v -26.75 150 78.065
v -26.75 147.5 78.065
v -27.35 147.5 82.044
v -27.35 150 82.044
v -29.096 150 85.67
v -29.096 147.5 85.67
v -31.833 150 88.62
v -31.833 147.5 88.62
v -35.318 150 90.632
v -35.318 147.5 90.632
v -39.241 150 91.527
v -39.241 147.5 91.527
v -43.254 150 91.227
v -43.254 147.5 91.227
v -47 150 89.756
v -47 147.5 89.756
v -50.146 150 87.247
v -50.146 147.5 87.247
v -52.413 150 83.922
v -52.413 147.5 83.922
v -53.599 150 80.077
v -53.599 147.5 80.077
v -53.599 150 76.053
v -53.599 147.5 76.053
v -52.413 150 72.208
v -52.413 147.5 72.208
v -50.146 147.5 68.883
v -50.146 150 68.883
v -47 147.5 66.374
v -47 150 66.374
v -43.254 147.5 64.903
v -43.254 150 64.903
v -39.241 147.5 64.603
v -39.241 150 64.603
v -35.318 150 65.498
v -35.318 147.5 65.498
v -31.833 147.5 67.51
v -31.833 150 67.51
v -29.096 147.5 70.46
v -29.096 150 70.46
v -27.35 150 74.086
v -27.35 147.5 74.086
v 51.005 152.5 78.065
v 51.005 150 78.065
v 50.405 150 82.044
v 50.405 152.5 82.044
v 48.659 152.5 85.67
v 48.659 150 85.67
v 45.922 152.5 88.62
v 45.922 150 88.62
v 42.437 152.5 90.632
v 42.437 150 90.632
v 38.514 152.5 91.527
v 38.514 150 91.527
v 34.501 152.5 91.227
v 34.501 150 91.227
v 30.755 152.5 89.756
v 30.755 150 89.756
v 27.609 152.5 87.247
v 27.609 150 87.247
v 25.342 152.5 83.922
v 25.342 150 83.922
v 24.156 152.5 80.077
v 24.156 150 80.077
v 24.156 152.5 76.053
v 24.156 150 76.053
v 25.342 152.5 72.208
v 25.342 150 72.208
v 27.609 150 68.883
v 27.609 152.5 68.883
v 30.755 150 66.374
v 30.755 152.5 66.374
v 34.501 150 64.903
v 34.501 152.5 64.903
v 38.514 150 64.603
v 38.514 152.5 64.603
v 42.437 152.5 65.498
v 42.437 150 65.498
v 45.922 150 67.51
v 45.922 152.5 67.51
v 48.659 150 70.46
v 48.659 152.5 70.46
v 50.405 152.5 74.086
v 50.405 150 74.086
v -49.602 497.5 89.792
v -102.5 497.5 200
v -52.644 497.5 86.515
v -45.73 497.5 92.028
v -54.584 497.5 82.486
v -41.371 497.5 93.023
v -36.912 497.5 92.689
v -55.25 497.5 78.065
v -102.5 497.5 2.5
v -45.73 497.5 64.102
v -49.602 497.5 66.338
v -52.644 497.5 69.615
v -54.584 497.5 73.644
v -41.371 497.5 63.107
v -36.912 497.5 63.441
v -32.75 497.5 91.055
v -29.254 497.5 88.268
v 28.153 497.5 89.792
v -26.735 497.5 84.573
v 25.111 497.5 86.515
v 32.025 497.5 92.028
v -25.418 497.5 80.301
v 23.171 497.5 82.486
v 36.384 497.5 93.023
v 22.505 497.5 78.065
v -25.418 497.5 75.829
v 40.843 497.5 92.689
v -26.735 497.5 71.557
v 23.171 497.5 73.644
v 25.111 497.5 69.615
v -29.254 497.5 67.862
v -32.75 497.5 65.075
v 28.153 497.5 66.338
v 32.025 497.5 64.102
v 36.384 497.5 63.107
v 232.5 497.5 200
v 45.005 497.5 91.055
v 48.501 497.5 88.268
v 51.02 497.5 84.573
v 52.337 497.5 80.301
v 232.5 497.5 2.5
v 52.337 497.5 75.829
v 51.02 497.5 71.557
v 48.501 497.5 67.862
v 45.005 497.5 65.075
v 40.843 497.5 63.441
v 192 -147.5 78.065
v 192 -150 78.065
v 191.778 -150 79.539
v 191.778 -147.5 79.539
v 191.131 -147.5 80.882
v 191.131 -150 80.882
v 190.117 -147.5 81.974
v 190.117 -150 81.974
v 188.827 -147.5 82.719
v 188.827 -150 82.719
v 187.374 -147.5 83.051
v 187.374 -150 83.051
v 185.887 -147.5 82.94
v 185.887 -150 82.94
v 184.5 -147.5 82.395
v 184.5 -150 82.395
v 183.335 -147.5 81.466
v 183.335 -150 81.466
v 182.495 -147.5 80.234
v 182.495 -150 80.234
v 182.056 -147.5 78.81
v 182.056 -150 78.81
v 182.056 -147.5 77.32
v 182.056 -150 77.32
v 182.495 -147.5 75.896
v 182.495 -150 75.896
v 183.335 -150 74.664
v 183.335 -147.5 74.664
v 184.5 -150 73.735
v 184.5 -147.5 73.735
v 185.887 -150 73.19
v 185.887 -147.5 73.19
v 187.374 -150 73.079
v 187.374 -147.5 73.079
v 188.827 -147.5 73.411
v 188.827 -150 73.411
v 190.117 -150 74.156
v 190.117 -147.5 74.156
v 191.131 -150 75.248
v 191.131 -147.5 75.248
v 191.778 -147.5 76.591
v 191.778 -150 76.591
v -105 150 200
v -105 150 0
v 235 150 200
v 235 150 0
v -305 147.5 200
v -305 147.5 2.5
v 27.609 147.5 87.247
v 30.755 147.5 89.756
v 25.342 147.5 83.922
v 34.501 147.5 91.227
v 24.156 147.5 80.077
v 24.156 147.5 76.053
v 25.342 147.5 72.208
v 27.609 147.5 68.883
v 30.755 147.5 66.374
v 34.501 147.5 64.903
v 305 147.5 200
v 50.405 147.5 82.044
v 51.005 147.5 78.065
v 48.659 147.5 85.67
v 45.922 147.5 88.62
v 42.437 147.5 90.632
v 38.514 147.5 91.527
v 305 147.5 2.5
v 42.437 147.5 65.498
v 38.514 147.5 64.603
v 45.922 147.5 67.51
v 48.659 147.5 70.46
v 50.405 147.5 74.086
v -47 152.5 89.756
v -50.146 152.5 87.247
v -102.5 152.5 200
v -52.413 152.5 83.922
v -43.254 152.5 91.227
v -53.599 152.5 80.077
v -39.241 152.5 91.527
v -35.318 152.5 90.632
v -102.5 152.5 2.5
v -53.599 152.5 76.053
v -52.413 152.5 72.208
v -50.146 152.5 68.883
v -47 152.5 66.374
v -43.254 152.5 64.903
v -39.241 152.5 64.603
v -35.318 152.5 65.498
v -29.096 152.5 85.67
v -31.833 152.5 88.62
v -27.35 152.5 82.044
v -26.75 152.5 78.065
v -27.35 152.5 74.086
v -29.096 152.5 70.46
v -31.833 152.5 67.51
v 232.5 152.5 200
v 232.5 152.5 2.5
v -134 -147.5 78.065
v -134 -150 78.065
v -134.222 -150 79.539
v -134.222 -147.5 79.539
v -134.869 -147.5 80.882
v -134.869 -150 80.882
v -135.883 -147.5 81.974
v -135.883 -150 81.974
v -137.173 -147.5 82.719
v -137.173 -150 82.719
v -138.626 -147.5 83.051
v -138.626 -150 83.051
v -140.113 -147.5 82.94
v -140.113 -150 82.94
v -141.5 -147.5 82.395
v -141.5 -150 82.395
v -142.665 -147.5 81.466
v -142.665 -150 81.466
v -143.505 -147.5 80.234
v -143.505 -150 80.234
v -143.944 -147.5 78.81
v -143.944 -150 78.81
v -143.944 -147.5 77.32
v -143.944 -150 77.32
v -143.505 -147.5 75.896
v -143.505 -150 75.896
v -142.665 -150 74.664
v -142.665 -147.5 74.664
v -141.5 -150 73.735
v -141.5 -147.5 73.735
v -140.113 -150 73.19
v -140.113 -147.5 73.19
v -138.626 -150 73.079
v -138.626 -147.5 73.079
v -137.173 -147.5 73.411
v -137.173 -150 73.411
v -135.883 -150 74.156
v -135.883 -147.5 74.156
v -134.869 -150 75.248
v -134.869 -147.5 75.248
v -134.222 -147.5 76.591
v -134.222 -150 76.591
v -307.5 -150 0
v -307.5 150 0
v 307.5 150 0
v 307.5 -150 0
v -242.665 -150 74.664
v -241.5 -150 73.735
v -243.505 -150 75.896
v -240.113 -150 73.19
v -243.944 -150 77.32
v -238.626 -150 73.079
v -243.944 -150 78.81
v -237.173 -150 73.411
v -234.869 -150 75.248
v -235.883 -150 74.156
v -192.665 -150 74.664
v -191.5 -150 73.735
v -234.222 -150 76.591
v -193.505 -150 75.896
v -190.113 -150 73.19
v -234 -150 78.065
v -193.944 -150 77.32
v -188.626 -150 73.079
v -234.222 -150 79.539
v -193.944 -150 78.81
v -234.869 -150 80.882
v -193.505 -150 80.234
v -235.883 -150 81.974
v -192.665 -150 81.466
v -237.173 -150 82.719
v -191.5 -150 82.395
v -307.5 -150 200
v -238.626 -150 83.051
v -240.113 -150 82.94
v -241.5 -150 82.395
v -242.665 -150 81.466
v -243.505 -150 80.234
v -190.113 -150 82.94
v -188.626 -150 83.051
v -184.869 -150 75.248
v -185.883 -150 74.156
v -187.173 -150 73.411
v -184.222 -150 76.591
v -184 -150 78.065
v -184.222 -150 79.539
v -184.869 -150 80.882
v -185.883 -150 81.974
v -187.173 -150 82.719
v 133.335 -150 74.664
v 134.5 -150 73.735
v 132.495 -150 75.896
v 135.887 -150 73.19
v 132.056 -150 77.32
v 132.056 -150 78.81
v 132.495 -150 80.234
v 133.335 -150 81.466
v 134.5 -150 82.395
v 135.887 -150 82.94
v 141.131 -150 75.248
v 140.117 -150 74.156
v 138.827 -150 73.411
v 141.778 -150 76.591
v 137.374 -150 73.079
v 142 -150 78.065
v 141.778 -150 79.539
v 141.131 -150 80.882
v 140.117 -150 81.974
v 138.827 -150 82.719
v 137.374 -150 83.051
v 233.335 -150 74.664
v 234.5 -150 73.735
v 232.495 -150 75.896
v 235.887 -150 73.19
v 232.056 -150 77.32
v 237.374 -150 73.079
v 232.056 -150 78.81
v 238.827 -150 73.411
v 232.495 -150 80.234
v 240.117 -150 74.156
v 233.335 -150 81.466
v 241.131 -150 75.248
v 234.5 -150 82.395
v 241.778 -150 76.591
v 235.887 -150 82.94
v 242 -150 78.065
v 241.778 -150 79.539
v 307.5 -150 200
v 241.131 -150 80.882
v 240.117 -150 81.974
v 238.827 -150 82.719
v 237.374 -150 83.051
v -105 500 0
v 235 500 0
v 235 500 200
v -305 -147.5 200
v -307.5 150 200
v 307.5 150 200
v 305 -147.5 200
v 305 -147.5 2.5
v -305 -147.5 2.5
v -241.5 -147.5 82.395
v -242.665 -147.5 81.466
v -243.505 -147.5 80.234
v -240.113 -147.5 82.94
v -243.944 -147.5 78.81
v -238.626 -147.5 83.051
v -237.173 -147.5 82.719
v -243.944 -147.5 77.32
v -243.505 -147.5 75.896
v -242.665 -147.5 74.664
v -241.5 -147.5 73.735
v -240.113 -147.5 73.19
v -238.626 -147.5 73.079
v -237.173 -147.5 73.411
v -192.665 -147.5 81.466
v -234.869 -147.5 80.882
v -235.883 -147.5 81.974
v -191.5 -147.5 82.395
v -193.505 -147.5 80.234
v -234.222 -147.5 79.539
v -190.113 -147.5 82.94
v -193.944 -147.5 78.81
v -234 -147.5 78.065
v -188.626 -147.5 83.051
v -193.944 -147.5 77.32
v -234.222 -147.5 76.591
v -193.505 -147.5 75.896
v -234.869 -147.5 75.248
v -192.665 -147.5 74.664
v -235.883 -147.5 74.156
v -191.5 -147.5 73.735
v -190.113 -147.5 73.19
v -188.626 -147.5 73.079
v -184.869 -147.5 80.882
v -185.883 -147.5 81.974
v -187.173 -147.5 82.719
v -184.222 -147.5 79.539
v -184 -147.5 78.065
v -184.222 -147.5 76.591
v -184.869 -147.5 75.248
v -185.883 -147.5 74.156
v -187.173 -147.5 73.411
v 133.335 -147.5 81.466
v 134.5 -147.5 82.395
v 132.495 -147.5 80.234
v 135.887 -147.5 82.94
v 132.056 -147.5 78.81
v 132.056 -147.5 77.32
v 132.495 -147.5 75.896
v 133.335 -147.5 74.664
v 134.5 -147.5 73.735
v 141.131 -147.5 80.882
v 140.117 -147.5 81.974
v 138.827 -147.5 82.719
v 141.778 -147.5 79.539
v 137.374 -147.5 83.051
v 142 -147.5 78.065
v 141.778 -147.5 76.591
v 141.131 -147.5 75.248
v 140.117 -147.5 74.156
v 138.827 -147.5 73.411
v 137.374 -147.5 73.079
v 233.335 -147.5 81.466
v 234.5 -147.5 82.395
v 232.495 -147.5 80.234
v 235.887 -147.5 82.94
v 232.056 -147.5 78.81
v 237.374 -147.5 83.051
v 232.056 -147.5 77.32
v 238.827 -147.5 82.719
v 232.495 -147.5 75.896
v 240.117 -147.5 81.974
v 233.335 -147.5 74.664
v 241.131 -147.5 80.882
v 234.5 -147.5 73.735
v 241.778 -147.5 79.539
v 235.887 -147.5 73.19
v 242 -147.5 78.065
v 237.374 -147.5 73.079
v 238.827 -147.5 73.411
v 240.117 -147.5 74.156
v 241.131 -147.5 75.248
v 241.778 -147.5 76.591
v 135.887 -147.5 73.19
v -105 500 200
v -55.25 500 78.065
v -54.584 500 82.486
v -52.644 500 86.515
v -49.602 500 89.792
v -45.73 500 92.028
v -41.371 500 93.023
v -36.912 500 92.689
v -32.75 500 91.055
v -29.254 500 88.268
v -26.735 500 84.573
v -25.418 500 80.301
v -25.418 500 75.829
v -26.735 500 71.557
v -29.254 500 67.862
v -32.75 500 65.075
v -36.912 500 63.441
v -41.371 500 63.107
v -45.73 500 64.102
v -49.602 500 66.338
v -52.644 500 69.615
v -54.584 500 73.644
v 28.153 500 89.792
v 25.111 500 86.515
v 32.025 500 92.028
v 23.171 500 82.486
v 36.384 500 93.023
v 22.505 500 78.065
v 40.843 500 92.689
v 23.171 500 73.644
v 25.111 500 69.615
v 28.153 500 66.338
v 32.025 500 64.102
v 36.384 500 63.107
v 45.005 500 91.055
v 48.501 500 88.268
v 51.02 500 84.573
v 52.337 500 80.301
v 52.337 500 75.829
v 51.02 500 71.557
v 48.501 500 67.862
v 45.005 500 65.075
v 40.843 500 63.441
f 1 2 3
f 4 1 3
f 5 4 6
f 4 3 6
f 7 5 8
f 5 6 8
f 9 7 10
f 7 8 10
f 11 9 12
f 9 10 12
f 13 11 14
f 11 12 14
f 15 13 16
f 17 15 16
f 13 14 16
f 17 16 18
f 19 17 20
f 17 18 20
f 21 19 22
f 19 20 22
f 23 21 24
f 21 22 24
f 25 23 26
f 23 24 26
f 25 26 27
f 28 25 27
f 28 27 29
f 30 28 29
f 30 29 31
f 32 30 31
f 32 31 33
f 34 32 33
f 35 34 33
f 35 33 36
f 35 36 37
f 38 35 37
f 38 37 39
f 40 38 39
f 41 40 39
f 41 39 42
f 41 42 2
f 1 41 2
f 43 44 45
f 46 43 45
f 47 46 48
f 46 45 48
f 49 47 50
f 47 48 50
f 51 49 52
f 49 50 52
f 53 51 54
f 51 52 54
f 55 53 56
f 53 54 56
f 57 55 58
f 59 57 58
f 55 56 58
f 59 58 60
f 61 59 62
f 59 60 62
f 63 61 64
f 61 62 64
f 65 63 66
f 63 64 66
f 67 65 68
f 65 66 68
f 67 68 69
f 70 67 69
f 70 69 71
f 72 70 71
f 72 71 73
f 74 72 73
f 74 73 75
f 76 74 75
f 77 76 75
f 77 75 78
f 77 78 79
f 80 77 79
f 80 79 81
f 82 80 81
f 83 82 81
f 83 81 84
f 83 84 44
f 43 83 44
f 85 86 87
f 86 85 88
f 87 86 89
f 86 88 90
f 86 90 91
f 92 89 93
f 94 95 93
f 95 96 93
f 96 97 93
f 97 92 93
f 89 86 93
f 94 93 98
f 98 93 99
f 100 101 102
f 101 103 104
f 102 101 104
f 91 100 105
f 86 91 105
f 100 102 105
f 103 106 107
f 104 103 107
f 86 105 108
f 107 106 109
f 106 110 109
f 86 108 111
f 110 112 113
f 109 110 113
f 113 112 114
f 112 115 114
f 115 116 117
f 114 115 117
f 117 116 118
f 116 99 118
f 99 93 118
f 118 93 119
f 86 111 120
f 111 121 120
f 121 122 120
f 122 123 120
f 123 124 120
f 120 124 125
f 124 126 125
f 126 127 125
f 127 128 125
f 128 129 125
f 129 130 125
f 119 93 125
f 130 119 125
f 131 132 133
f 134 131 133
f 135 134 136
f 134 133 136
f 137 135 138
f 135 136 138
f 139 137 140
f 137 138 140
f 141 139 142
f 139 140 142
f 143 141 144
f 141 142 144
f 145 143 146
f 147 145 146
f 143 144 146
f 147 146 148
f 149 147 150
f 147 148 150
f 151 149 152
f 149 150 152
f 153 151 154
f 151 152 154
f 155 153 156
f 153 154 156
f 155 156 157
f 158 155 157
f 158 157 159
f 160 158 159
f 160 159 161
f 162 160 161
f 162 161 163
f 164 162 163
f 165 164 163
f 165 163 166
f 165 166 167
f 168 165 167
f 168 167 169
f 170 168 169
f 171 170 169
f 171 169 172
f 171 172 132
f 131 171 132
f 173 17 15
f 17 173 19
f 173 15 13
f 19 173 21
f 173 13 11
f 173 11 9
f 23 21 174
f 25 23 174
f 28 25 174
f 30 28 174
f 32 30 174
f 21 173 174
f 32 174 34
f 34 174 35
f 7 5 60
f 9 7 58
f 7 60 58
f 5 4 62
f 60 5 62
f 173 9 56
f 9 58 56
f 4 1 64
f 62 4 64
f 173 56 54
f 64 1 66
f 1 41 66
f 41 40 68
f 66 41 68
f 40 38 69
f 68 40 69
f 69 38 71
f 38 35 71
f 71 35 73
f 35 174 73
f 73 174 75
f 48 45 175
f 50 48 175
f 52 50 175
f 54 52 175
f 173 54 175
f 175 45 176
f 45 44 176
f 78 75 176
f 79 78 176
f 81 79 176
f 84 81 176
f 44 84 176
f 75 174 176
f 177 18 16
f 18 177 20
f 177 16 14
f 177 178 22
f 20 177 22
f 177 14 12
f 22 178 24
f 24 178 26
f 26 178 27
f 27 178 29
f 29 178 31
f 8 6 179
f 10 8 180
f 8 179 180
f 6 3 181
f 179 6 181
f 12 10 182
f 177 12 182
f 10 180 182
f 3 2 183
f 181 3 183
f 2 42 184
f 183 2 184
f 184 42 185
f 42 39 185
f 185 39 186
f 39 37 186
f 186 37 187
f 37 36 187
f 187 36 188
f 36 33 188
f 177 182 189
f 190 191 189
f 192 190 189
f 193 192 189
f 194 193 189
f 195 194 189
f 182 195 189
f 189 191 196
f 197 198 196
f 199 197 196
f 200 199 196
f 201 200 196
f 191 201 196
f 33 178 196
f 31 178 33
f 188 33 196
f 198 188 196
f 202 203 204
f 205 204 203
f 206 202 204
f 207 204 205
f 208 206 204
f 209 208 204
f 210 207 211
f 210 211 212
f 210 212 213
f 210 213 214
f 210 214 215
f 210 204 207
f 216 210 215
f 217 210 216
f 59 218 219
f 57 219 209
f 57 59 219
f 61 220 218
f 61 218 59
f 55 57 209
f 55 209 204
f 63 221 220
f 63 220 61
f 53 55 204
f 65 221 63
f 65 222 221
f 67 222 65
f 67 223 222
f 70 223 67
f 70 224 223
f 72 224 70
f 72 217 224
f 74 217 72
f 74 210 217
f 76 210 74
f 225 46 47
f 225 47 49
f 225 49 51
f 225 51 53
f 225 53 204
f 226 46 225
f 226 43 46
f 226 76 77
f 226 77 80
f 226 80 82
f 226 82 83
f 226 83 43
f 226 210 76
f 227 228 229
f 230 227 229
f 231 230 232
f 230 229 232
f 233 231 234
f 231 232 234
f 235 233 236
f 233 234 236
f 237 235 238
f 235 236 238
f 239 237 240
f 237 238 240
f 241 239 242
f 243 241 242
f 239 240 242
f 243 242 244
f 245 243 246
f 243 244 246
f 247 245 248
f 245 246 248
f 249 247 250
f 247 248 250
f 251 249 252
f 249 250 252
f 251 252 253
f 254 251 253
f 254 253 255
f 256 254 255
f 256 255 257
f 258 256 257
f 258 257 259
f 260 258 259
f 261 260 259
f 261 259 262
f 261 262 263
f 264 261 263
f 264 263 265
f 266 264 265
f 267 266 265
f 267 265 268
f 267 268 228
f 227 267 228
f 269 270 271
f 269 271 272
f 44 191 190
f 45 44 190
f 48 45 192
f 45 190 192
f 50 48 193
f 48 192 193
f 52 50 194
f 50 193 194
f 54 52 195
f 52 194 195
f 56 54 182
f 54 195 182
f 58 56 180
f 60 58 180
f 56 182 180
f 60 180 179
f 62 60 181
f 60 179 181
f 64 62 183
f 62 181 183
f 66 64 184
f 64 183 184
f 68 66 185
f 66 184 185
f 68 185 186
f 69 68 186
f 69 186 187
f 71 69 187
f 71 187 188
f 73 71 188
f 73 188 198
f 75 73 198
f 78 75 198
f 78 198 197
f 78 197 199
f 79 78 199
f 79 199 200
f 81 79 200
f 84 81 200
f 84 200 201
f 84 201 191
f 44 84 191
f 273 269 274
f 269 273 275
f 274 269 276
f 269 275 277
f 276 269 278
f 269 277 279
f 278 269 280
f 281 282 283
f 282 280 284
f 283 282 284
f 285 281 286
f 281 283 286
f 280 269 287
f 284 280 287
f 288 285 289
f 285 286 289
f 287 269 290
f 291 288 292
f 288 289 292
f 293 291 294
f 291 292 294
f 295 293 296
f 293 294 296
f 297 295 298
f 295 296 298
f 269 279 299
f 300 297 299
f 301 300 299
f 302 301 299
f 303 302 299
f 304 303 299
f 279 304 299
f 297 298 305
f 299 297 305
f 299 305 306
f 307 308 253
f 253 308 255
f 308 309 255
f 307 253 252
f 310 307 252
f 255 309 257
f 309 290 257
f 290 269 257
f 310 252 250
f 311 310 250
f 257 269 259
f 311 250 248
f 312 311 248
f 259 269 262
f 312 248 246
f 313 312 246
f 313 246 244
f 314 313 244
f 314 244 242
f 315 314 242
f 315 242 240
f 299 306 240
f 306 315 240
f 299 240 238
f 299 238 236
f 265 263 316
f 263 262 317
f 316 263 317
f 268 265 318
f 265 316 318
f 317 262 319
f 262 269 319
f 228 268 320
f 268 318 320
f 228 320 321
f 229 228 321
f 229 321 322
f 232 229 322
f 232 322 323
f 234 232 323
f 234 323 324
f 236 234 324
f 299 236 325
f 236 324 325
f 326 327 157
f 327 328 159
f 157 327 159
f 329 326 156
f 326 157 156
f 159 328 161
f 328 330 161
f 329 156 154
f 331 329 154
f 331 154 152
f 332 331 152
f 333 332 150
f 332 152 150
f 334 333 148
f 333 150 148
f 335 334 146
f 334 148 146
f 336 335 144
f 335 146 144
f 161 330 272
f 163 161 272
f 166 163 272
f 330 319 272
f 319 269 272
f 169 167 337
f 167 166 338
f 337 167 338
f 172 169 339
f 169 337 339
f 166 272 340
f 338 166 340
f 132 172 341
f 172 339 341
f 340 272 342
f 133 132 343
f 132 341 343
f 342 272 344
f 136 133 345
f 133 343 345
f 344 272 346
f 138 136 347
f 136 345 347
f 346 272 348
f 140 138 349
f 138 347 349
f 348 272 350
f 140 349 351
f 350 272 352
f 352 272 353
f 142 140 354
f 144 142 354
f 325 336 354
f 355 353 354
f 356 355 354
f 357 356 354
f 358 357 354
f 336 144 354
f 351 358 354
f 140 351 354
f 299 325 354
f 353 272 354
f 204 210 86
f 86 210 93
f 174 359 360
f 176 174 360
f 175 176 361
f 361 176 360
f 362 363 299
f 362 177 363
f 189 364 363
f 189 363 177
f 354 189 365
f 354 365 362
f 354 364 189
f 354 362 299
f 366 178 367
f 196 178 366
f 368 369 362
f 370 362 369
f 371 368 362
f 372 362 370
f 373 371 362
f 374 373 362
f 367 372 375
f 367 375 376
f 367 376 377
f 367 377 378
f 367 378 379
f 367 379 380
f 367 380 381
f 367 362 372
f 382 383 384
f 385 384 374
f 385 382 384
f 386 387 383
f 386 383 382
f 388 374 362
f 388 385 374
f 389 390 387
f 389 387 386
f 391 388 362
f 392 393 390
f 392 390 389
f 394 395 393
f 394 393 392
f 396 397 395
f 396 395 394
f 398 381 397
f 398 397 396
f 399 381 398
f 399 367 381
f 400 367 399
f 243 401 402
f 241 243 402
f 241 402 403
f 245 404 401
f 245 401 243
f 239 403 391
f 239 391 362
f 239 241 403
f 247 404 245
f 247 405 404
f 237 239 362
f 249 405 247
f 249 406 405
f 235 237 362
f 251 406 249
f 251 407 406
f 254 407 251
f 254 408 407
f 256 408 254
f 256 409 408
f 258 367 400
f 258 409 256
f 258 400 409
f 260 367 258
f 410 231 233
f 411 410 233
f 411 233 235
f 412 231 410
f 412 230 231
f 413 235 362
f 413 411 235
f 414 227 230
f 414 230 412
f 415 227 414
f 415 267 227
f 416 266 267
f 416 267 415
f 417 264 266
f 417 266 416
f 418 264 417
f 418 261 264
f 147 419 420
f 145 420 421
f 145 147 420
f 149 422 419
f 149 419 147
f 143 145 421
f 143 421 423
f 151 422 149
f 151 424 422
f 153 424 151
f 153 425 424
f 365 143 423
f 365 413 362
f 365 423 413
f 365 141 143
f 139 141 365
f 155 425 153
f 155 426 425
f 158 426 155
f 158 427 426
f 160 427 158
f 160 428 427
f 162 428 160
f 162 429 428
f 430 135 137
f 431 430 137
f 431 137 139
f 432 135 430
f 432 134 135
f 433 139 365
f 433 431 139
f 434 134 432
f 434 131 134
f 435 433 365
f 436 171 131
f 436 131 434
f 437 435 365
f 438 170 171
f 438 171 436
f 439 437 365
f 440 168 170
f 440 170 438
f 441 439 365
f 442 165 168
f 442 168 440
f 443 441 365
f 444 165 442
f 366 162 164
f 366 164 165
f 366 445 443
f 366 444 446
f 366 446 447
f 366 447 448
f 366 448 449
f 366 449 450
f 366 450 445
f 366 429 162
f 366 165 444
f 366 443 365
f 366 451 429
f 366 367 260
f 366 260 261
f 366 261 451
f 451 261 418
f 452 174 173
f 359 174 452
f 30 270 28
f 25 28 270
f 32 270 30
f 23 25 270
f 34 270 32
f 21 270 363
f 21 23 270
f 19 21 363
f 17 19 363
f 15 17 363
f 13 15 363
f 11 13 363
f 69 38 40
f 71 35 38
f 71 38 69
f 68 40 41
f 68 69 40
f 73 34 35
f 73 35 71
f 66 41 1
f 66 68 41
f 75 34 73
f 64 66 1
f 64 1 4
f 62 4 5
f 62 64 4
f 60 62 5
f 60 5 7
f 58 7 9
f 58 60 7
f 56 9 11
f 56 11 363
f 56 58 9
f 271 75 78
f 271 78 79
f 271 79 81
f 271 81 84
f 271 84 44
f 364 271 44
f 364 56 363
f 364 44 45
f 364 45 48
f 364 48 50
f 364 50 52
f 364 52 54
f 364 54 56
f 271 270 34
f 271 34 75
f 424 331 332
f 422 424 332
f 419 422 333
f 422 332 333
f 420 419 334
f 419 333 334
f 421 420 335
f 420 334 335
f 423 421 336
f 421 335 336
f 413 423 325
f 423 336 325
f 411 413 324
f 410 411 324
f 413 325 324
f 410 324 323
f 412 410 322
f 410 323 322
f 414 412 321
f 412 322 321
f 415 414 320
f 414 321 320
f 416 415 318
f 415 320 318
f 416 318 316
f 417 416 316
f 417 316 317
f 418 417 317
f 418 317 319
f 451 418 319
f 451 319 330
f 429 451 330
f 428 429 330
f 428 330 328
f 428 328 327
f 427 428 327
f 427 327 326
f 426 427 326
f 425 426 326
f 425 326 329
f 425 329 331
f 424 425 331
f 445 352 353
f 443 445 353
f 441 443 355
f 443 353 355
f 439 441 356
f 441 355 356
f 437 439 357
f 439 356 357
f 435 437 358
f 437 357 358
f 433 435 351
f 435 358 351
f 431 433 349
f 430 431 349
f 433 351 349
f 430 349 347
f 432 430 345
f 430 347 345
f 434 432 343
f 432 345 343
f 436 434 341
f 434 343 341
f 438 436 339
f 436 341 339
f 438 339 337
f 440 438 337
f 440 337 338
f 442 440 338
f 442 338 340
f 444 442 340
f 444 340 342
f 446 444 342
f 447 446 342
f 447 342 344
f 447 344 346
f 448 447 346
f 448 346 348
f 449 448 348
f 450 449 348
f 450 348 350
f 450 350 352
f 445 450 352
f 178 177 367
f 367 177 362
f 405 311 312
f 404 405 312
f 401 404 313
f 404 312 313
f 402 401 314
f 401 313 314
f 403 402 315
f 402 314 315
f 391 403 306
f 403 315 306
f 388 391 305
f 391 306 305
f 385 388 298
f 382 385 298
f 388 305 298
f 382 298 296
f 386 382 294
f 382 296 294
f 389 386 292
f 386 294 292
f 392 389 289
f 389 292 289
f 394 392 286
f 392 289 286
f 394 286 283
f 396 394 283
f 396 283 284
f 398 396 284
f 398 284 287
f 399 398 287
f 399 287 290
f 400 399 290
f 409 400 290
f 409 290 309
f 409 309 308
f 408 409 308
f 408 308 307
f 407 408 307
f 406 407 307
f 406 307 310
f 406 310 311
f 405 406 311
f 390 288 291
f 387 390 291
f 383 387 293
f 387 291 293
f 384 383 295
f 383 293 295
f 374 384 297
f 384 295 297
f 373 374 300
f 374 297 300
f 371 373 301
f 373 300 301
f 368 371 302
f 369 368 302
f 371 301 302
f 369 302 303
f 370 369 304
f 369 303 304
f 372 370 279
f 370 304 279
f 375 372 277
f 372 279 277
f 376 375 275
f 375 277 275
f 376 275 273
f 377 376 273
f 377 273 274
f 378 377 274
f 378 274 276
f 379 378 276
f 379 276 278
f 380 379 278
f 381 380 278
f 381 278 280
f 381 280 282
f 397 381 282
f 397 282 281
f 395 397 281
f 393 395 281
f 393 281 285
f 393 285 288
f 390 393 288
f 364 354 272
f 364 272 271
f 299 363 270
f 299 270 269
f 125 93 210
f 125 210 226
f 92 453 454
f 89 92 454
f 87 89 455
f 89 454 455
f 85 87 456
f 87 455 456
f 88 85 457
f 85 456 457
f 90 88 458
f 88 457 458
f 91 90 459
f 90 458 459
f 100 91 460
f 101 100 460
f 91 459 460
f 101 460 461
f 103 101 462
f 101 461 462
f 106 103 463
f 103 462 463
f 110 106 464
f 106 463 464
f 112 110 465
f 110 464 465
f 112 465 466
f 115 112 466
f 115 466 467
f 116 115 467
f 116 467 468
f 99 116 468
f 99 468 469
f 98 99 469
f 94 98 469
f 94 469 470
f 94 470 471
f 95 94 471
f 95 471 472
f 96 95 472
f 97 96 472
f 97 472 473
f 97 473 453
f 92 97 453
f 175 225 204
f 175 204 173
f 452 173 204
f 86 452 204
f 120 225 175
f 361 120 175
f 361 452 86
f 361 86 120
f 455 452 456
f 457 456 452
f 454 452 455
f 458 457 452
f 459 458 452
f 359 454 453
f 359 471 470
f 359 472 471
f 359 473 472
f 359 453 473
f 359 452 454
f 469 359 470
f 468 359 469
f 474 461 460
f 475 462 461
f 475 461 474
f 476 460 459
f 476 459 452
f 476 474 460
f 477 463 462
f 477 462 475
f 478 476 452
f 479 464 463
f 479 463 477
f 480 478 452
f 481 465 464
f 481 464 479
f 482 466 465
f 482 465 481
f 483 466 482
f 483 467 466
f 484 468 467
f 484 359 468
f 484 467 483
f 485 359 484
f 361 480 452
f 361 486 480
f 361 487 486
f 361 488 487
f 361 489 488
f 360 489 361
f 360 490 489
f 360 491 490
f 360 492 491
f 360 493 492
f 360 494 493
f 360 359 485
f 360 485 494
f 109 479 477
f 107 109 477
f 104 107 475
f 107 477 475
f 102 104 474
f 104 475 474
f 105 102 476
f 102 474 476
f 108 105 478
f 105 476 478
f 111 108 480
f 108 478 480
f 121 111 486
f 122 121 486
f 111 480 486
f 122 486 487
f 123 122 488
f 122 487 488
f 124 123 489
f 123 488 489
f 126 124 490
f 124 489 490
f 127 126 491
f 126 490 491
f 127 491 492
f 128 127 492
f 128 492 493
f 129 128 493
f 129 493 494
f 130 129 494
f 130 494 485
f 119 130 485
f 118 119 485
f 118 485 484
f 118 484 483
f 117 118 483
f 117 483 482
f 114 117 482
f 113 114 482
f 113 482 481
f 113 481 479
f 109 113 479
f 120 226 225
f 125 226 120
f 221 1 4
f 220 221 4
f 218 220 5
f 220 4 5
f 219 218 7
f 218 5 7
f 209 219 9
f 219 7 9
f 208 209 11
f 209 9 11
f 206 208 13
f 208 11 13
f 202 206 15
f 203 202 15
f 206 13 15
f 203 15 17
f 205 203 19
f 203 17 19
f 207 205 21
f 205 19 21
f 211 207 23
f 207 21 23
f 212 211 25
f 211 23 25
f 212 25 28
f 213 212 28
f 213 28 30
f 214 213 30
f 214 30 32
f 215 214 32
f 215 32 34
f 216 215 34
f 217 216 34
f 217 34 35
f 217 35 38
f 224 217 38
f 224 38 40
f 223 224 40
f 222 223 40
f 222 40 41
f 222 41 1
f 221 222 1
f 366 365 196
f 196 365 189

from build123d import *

# Parameters (mm, degrees)
F0_W      = 930
F0_H      = 300
F2_DEPTH  = 200
F3_T      = -2.5
F1_W      = 340
F1_H      = 350
F4_DEPTH  = 200
F5_T      = -2.5
F6_R      = 5
F7_DEPTH  = 25
F8_R      = 13.5
F9_DEPTH  = 25
F10_R     = 15
F11_DEPTH = 25
F12_DEPTH = 160
F13_DEPTH = 160
F14_W     = 300
F14_H     = 200
F15_DEPTH = 2.5
F16_W     = 300
F16_H     = 200
F17_DEPTH = 2.5


# Not quite as in the source:
# - a feature names something its author has since deleted; it is built from what else it names


with BuildPart() as f2:
    # F0 (on Top) → F2 (new body)
    with BuildSketch(Plane.XY):
        Rectangle(F0_W, F0_H)
    extrude(amount=F2_DEPTH)

    # F3
    f3_openings = [f2.faces().sort_by_distance(p)[0] for p in [
        (0, 0, 200),
    ]]
    offset(amount=F3_T, openings=f3_openings)

    # F6 (on face) → F7 (cut)
    with BuildSketch(Plane.XZ.offset(150)):
        with Locations((137, 78.065)):
            Circle(F6_R)
        with Locations((187, 78.065)):
            Circle(F6_R)
        with Locations((237, 78.065)):
            Circle(F6_R)
        with Locations((387, 78.065)):
            Circle(F6_R)
        with Locations((337, 78.065)):
            Circle(F6_R)
        with Locations((-139, 78.065)):
            Circle(F6_R)
        with Locations((-189, 78.065)):
            Circle(F6_R)
        with Locations((-239, 78.065)):
            Circle(F6_R)
        with Locations((-339, 78.065)):
            Circle(F6_R)
        with Locations((-389, 78.065)):
            Circle(F6_R)
    extrude(amount=-F7_DEPTH, mode=Mode.SUBTRACT)


with BuildPart() as f4:
    # F1 (on Top) → F4 (new body)
    with BuildSketch(Plane.XY):
        with Locations((65, 325)):
            Rectangle(F1_W, F1_H)
    extrude(amount=F4_DEPTH)

    # F5
    f5_openings = [f4.faces().sort_by_distance(p)[0] for p in [
        (65, 325, 200),
    ]]
    offset(amount=F5_T, openings=f5_openings)


with BuildPart() as f9_tool:
    # F8 (on face) → F9 (new body)
    with BuildSketch(Plane.XZ.offset(-147.5)):
        with Locations((37.505, 78.065)):
            Circle(F8_R)
        with Locations((-40.25, 78.065)):
            Circle(F8_R)
    extrude(amount=-F9_DEPTH)


with BuildPart() as f2_1:
    add(f2.part)

    # F9: cut by f9_tool
    add(f9_tool.part, mode=Mode.SUBTRACT)

    # F12 (cut): a face of the model
    f12_faces = [f2_1.faces().sort_by_distance(p)[0] for p in [
        (-465, 0, 100),
    ]]
    extrude(f12_faces, amount=-F12_DEPTH, mode=Mode.SUBTRACT)

    # F13 (cut): a face of the model
    f13_faces = [f2_1.faces().sort_by_distance(p)[0] for p in [
        (465, 0, 100),
    ]]
    extrude(f13_faces, amount=-F13_DEPTH, mode=Mode.SUBTRACT)

    # F14 (on face) → F15 (join)
    with BuildSketch(Plane.YZ.offset(305)):
        with Locations((0, 100)):
            Rectangle(F14_W, F14_H)
    extrude(amount=F15_DEPTH)

    # F16 (on face) → F17 (join)
    with BuildSketch(Plane(origin=(-305, 0, 0), x_dir=(0, -1, 0), z_dir=(-1, 0, 0))):
        with Locations((0, 100)):
            Rectangle(F16_W, F16_H)
    extrude(amount=F17_DEPTH)


with BuildPart() as f4_1:
    add(f4.part)

    # F9: cut by f9_tool
    add(f9_tool.part, mode=Mode.SUBTRACT)

    # F10 (on face) → F11 (cut)
    with BuildSketch(Plane(origin=(0, 500, 0), x_dir=(-1, 0, 0), z_dir=(0, 1, 0))):
        with Locations((-37.505, 78.065)):
            Circle(F10_R)
        with Locations((40.25, 78.065)):
            Circle(F10_R)
    extrude(amount=-F11_DEPTH, mode=Mode.SUBTRACT)


solid = Compound([f2_1.part, f4_1.part])
